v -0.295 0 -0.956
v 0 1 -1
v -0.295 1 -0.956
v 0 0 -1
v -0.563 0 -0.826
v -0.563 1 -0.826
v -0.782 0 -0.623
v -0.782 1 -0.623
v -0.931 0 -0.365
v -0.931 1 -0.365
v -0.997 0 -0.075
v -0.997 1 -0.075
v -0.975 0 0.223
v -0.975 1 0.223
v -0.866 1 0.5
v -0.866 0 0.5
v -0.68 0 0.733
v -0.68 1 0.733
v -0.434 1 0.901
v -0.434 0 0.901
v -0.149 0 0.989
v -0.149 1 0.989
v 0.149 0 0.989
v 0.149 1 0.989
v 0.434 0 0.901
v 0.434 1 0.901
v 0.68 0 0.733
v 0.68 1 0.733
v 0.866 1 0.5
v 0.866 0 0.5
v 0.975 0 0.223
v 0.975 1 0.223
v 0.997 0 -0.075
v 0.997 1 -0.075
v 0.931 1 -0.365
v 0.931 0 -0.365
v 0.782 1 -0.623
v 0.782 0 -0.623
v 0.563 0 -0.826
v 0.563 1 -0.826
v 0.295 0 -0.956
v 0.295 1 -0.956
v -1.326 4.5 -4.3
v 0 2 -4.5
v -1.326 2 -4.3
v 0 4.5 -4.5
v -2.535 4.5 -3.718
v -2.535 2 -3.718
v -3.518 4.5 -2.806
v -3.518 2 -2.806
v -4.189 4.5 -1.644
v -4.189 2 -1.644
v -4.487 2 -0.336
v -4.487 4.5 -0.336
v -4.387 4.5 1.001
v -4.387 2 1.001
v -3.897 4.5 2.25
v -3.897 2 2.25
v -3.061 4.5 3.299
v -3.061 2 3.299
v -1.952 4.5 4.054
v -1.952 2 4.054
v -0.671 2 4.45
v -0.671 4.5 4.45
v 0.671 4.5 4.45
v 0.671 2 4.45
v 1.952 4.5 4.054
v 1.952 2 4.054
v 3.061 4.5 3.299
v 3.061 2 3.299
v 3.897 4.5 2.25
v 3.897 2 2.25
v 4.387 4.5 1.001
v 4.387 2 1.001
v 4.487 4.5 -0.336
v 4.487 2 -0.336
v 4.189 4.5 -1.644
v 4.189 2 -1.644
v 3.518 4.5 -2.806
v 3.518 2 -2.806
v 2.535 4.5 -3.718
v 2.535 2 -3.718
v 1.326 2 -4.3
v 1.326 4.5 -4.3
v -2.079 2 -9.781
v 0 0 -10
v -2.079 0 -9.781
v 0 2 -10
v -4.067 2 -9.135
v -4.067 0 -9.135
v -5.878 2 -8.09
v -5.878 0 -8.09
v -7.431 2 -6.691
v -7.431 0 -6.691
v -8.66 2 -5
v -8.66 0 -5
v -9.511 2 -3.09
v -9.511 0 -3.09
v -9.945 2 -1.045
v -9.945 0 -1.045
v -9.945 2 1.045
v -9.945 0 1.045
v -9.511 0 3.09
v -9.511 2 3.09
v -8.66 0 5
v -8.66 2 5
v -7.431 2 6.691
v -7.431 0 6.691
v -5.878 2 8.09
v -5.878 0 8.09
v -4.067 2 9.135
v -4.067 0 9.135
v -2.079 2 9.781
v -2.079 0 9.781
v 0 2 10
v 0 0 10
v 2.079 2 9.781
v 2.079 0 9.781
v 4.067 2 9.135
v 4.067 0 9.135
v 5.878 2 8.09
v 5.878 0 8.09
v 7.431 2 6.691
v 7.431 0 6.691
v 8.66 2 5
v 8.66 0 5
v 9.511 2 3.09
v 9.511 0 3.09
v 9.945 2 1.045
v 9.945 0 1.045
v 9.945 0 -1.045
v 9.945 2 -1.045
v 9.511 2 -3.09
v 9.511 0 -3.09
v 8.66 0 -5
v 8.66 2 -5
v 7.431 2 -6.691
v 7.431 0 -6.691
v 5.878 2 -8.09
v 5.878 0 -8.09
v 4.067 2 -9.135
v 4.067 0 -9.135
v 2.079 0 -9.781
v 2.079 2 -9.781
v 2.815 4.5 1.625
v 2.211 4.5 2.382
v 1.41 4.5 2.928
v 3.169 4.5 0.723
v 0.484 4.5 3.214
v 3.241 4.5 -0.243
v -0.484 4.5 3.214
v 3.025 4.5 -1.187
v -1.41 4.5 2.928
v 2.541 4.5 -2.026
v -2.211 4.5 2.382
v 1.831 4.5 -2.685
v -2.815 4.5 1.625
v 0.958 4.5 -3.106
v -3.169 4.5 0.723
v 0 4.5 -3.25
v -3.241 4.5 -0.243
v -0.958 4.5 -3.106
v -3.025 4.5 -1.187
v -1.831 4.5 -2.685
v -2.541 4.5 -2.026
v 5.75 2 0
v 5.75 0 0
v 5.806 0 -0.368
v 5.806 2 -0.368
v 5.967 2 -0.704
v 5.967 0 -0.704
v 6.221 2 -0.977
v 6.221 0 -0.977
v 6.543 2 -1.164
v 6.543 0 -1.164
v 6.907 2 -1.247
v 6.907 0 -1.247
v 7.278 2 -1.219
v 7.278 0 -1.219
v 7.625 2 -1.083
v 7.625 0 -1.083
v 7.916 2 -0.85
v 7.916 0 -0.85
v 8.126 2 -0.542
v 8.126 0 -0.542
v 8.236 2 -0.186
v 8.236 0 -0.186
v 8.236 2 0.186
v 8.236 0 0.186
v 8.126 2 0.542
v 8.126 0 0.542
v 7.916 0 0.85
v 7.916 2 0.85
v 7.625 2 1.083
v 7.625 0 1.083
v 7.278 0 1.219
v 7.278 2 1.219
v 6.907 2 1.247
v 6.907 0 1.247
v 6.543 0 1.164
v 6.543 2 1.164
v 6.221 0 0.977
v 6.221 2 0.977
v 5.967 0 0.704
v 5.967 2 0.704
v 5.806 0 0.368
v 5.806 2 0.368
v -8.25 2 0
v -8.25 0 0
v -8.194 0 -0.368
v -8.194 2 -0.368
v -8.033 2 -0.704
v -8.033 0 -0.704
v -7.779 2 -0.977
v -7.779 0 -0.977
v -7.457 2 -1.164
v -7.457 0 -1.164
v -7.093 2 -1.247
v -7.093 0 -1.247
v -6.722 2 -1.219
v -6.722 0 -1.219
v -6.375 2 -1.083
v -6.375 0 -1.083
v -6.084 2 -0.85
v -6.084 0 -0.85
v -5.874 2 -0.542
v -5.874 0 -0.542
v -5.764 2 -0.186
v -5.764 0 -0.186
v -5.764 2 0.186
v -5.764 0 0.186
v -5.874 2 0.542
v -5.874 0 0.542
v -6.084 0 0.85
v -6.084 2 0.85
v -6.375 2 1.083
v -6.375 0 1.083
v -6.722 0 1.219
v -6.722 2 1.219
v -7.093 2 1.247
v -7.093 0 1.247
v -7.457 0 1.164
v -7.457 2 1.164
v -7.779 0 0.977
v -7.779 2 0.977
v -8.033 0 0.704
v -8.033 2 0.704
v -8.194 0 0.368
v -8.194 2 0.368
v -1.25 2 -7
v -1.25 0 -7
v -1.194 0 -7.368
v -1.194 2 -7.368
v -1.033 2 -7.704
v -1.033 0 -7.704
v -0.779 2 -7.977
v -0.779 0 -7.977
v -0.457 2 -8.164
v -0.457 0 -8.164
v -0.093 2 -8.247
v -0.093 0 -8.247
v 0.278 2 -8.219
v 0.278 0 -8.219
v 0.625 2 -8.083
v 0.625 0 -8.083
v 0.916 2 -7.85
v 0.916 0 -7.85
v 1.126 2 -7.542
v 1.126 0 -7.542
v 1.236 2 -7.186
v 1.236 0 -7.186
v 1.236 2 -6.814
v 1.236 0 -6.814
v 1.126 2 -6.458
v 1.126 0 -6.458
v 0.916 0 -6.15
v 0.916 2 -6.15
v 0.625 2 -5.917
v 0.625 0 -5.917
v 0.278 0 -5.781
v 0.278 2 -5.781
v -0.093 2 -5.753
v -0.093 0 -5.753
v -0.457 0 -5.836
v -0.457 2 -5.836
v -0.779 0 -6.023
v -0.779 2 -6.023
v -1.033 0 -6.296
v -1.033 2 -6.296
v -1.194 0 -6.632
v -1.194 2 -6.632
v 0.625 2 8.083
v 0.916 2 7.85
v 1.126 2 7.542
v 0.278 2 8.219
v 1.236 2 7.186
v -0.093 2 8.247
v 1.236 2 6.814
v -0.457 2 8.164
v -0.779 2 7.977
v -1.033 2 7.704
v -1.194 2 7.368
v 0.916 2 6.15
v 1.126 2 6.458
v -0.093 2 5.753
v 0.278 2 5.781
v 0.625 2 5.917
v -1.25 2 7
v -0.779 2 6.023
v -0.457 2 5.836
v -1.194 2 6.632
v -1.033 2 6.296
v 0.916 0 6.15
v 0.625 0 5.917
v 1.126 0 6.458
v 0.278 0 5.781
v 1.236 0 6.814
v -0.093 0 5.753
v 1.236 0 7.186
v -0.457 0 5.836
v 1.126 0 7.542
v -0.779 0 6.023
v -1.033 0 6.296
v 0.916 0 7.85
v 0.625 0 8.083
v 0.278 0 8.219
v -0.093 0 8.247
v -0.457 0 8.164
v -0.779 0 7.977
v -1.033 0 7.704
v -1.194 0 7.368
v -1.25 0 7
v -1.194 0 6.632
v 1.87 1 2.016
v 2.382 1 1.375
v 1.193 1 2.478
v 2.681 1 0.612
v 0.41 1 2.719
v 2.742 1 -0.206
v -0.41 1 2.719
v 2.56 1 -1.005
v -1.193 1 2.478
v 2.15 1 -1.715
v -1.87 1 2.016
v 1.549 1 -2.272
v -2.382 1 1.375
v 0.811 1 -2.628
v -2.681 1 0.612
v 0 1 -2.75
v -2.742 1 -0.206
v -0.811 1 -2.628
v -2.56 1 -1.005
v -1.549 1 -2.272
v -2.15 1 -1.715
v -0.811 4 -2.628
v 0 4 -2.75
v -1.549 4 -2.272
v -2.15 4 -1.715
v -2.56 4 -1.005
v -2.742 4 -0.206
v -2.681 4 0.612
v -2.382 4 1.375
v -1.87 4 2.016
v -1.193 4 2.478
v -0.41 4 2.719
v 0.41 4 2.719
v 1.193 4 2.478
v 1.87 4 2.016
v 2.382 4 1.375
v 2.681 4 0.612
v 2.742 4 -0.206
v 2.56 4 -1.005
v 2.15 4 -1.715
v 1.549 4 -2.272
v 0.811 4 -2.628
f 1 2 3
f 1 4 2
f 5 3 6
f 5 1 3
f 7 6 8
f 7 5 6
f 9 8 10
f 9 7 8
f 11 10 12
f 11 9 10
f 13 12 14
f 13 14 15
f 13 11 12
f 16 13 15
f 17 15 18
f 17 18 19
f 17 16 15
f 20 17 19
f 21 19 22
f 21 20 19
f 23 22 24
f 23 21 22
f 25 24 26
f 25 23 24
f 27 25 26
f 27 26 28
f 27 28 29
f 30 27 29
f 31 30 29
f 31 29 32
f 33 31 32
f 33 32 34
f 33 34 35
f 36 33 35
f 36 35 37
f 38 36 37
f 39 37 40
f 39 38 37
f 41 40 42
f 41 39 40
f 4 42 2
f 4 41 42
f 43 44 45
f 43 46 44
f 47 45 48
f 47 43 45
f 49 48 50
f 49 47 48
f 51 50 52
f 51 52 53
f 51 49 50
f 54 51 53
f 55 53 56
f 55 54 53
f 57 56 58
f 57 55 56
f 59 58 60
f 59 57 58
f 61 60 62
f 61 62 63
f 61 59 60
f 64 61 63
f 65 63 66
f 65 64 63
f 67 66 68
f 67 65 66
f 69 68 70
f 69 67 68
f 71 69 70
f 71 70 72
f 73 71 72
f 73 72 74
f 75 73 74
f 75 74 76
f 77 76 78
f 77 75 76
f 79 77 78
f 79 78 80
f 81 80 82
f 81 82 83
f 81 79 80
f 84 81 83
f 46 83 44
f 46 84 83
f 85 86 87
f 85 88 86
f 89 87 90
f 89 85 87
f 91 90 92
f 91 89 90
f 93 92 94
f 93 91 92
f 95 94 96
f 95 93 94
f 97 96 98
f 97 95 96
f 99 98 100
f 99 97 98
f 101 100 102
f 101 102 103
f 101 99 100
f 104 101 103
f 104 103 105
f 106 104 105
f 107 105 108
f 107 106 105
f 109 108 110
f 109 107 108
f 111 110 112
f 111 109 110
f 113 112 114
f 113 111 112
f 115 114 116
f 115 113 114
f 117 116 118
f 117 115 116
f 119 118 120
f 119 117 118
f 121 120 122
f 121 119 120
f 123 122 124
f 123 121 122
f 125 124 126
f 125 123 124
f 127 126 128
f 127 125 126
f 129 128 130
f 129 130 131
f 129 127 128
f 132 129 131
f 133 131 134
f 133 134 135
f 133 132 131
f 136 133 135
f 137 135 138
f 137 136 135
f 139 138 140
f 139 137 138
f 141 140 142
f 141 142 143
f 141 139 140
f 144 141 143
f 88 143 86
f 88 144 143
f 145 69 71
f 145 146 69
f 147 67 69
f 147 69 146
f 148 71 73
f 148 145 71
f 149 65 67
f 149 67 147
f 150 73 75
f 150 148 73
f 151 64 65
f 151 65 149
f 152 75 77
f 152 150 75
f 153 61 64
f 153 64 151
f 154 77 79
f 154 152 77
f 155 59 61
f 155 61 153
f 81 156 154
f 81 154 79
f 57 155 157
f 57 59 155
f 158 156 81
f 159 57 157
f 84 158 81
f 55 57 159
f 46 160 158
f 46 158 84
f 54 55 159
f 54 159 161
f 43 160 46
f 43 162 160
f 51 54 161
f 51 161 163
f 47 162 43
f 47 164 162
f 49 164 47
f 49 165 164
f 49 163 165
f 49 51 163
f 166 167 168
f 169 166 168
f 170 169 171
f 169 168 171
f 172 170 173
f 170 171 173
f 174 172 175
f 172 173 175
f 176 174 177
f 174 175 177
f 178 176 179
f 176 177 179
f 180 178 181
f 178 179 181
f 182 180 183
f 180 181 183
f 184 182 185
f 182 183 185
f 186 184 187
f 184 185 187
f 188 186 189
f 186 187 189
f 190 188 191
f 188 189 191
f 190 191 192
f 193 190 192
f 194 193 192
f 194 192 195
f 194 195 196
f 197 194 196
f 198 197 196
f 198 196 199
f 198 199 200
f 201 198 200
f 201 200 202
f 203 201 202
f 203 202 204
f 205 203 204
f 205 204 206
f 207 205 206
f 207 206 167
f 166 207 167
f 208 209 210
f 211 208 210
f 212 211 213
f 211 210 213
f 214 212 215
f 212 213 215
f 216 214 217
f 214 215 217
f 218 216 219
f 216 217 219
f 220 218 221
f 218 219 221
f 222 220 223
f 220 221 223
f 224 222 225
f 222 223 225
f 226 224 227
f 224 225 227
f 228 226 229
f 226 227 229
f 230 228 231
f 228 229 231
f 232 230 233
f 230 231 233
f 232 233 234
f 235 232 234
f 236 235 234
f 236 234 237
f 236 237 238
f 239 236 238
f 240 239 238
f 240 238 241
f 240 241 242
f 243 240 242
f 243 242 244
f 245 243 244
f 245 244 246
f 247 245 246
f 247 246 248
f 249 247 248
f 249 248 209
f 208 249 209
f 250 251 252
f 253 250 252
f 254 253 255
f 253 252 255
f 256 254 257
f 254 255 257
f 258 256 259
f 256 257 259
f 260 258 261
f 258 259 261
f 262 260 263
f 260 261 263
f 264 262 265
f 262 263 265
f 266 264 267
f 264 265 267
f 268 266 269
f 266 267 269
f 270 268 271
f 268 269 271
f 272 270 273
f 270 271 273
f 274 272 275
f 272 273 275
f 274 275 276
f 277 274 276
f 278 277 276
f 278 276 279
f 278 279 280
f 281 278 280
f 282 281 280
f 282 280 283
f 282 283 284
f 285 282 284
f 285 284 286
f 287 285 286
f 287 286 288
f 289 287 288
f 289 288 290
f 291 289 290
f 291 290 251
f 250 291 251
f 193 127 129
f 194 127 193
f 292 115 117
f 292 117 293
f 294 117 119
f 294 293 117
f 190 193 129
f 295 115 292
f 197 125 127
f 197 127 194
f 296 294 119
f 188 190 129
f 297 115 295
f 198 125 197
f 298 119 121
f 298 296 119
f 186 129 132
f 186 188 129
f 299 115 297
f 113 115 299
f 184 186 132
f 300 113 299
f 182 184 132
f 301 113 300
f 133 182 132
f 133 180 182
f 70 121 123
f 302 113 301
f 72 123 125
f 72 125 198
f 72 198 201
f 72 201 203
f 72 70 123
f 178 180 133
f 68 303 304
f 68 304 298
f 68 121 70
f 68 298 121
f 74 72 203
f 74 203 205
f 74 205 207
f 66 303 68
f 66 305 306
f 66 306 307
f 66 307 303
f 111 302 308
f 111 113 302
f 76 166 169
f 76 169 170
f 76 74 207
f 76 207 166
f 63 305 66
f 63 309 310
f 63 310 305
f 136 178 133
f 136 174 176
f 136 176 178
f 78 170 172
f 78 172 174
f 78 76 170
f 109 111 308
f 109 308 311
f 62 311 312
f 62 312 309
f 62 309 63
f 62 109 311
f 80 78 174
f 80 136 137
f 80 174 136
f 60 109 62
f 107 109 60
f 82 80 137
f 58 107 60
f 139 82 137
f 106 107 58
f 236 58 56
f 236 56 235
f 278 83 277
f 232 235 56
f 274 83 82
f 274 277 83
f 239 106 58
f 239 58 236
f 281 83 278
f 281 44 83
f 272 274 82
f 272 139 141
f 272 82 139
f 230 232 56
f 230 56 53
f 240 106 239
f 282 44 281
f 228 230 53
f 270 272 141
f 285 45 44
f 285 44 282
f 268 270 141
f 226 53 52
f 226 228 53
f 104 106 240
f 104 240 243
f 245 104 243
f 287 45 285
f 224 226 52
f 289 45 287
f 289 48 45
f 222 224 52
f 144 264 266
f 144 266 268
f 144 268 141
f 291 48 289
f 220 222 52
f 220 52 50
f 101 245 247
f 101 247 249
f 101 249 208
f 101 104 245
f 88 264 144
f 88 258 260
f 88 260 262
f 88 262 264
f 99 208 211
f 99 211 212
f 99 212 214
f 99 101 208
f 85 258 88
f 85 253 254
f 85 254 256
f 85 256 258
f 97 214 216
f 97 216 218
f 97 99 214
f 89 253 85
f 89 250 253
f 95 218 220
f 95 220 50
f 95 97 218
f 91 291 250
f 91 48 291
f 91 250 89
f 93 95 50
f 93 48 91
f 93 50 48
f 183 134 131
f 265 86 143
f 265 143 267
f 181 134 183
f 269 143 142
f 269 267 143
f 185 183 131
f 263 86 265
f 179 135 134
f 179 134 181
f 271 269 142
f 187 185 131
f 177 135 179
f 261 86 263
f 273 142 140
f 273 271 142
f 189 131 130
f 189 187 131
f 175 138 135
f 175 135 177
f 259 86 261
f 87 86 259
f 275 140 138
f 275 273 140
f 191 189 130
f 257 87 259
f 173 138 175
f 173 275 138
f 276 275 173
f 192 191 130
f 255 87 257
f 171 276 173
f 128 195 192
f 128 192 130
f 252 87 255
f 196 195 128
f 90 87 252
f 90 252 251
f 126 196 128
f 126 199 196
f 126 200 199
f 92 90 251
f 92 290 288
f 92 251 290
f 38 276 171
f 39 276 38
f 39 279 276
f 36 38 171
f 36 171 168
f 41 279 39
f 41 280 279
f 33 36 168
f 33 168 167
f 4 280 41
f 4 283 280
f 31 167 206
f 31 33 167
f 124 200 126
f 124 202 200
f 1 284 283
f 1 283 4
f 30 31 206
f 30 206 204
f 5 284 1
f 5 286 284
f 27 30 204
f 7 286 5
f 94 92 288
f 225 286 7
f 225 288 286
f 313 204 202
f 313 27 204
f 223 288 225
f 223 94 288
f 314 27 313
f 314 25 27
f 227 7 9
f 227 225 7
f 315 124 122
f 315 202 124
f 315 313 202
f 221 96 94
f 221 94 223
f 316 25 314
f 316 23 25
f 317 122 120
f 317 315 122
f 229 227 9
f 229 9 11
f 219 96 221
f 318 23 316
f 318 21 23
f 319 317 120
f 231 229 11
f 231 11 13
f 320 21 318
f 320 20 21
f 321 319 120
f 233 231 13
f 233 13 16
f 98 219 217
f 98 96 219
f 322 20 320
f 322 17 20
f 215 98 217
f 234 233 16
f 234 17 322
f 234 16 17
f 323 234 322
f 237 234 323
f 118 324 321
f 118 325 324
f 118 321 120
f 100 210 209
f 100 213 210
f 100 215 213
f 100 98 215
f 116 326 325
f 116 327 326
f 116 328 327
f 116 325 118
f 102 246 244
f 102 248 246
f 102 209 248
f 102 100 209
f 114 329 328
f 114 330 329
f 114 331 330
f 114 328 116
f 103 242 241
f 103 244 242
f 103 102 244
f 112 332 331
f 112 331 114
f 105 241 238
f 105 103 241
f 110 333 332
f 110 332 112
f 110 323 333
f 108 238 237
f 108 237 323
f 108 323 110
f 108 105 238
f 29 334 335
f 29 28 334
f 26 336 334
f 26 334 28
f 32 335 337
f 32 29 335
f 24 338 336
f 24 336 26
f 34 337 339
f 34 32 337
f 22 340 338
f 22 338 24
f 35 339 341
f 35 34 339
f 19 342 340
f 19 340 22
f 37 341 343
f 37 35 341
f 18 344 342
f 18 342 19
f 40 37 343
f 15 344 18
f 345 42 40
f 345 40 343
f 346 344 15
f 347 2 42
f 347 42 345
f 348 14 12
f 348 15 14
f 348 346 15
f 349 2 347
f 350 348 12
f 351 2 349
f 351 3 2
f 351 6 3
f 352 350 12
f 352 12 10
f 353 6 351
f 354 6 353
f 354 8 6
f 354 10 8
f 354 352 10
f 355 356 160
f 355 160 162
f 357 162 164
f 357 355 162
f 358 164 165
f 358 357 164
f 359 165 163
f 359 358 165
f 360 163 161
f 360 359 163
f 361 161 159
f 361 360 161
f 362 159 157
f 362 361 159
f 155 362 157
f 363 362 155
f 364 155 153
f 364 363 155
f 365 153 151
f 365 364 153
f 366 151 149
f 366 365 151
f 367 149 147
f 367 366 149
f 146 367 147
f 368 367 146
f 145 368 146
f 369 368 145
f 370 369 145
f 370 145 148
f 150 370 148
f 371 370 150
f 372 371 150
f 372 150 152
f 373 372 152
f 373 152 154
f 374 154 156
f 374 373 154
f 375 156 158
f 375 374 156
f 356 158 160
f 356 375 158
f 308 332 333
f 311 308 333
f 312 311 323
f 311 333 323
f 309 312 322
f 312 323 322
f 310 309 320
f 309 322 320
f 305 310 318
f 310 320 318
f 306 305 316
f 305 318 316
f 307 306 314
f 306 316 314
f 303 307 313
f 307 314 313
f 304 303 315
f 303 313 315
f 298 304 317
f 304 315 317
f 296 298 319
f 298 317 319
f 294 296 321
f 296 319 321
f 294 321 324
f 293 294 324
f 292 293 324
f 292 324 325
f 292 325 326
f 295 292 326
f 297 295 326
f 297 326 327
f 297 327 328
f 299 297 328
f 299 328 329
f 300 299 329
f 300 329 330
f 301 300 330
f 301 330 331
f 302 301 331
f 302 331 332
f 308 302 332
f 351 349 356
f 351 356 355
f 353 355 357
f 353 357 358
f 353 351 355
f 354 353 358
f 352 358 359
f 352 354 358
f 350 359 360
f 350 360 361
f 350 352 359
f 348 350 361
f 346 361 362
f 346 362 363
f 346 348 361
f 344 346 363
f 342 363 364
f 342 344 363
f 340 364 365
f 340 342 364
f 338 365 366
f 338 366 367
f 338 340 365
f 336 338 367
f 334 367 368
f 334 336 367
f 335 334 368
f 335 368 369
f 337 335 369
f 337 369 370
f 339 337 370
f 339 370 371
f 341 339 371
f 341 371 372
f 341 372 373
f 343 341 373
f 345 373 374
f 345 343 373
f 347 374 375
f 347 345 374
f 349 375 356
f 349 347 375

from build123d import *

# Parameters (mm, degrees)
HOLE_WIZARD_M3_1_D = 2.5
CHAMFER_1_SIZE     = 0.5


with BuildPart() as part:
    # 草图1 → 旋转1 (revolve)
    with BuildSketch(Plane(origin=(0, 0, 0), x_dir=(0, 0, -1), z_dir=(1, 0, 0))):
        Polygon((2.75, 0), (10, 0), (10, 2), (4.5, 2), (4.5, 4.5), (2.75, 4.5), (2.75, 1), (1, 1), (1, 0), align=None)
    revolve(axis=Axis((0, 0, 0), (0, 1, 0)))

    # M3 螺纹孔的螺纹孔钻头1 (through all)
    with Locations(Plane(origin=(0, 2, 0), x_dir=(1, 0, 0), z_dir=(0, 1, 0))):
        with Locations((0, -7), (0, 7), (-7, 0), (7, 0)):
            Hole(HOLE_WIZARD_M3_1_D / 2)

    # 倒角1
    chamfer_1_edges = [part.edges().sort_by_distance(p)[0] for p in [
        (0, 4.5, 2.75),
    ]]
    chamfer(chamfer_1_edges, length=CHAMFER_1_SIZE)


solid = part.part
